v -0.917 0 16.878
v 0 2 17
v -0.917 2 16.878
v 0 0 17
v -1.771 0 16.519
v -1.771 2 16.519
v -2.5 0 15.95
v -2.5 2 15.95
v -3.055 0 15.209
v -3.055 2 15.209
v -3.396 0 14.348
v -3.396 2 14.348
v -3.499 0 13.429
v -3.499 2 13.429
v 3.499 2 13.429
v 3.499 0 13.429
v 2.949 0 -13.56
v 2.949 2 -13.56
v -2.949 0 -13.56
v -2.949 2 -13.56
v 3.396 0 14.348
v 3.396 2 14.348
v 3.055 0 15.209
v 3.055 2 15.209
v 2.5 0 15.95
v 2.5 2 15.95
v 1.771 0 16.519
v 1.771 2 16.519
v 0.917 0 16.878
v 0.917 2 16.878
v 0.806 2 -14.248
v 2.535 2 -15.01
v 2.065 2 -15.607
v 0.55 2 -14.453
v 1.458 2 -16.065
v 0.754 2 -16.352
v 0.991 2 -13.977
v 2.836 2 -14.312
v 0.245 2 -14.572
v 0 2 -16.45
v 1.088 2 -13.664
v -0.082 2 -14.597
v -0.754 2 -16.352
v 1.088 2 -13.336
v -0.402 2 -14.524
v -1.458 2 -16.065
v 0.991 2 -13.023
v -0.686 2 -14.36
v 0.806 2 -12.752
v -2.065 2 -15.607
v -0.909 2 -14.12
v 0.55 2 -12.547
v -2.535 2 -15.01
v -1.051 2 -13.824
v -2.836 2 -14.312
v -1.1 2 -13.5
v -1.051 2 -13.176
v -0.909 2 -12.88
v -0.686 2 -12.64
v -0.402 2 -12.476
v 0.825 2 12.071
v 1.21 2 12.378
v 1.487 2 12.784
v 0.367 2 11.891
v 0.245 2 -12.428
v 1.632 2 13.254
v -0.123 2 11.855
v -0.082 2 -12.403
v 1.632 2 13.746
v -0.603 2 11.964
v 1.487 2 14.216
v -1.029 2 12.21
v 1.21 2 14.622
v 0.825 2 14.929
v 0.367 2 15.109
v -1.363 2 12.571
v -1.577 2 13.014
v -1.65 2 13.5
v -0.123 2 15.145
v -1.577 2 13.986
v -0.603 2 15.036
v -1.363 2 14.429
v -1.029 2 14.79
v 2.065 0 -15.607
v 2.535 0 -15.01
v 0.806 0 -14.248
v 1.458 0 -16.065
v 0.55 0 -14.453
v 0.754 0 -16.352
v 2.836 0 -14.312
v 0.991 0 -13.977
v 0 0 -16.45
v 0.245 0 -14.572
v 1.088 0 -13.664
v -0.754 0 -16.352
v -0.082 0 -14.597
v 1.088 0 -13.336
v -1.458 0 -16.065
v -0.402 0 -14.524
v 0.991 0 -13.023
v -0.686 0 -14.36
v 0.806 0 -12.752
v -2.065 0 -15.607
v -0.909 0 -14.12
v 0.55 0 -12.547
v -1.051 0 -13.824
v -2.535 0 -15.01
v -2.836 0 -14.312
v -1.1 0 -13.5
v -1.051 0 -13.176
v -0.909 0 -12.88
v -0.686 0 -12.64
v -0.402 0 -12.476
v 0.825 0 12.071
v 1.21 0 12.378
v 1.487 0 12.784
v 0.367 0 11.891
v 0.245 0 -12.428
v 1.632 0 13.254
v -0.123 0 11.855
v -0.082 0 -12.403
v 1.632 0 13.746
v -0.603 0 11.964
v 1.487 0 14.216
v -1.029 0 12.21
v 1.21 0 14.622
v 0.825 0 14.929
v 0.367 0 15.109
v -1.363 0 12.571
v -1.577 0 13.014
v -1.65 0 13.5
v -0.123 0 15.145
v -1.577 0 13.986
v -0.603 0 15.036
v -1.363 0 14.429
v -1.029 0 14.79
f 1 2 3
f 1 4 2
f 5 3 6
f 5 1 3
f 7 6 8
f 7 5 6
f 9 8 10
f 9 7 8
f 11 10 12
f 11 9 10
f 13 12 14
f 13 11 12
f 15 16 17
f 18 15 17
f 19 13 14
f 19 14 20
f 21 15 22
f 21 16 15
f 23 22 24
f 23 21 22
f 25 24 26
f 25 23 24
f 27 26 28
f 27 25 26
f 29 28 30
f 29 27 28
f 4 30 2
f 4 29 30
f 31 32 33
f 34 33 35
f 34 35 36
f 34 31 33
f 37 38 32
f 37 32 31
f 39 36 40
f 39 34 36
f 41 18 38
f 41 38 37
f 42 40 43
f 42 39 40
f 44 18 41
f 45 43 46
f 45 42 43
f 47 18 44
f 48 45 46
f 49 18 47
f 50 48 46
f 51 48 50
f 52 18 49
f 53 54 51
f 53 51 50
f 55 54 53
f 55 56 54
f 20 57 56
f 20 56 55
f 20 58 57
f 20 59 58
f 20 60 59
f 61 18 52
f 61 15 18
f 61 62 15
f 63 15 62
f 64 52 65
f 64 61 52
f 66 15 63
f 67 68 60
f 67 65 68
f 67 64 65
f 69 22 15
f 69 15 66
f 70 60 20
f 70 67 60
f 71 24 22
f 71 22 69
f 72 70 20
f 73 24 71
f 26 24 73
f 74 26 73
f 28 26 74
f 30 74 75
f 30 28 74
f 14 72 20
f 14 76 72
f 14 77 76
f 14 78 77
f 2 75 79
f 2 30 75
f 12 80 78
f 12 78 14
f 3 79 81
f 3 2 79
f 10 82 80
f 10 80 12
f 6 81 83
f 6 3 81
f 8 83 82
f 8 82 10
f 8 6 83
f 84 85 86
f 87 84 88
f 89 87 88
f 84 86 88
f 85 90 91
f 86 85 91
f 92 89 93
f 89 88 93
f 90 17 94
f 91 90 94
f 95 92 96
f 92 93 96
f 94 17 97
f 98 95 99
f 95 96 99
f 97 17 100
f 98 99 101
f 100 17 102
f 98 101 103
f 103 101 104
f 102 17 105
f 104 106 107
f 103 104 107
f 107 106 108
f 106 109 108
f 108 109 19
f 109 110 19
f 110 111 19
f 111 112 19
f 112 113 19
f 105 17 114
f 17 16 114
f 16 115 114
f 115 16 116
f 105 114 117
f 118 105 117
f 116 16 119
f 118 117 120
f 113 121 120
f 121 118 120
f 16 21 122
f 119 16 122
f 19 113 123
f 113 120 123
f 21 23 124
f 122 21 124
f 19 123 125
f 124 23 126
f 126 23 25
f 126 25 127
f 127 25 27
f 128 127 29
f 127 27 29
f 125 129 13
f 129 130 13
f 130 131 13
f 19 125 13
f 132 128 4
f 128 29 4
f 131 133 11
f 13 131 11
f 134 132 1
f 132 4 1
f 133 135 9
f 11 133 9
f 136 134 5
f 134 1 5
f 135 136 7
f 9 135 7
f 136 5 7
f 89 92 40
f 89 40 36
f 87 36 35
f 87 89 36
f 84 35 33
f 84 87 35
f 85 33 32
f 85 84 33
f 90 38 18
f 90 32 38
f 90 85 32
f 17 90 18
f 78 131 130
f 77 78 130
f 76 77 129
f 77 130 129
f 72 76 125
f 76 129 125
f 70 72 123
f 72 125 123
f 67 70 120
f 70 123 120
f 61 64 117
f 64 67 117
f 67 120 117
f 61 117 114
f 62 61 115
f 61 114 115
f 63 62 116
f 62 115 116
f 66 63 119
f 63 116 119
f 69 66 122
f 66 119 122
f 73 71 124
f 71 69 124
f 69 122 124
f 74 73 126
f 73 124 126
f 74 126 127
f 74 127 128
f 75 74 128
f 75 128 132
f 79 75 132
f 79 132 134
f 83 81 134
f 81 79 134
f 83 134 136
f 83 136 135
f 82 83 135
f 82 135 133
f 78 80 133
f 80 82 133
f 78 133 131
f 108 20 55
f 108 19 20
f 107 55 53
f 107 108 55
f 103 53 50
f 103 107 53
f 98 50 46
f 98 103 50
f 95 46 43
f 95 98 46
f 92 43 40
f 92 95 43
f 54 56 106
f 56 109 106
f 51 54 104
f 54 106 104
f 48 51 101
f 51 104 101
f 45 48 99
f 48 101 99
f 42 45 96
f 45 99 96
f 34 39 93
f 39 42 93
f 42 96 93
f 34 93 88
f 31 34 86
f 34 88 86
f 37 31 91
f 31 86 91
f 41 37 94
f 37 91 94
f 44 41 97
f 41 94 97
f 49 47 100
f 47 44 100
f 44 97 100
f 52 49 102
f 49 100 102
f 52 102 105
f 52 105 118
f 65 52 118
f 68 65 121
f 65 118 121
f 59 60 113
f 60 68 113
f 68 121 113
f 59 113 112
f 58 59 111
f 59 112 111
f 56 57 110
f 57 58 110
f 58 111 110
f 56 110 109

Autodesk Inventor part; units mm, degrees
ref_plane "YZ Plane" through (0, 0, 0) normal (1, 0, 0) x (0, 1, 0)
ref_plane "XZ Plane" through (0, 0, 0) normal (0, 1, 0) x (-1, 0, 0)
ref_plane "XY Plane" through (0, 0, 0) normal (0, 0, 1) x (1, 0, 0)
sketch "Эскиз1" plane through (0, 0, 0) normal (0, 1, 0) x (-1, 0, 0)
  line L0 (0, 17) -> (0, 17)
  line L1 (0, -17) -> (0, -17)
  arc A0 (3.4993, 13.4287) -> (0, 17) centre (0, 13.5) ccw
  circle A1 centre (0, 13.5) radius 1.65
  circle A2 centre (0, -13.5) radius 1.1
  line L2 (3.4993, 13.4287) -> (2.9494, -13.5601)
  arc A3 (0, -16.45) -> (2.9494, -13.5601) centre (0, -13.5) ccw
  arc A4 (0, 17) -> (-3.4993, 13.4287) centre (0, 13.5) ccw
  line L3 (-3.4993, 13.4287) -> (-2.9494, -13.5601)
  arc A5 (-2.9494, -13.5601) -> (0, -16.45) centre (0, -13.5) ccw
  point P0 (0, 0)
  dimension "d2" = 3.5
  dimension "d4" = 2.2
  dimension "d5" = 3.3
extrude "Выдавливание1" add sketch "Эскиз1" along normal blind 2
properties part number "servo_leg"
